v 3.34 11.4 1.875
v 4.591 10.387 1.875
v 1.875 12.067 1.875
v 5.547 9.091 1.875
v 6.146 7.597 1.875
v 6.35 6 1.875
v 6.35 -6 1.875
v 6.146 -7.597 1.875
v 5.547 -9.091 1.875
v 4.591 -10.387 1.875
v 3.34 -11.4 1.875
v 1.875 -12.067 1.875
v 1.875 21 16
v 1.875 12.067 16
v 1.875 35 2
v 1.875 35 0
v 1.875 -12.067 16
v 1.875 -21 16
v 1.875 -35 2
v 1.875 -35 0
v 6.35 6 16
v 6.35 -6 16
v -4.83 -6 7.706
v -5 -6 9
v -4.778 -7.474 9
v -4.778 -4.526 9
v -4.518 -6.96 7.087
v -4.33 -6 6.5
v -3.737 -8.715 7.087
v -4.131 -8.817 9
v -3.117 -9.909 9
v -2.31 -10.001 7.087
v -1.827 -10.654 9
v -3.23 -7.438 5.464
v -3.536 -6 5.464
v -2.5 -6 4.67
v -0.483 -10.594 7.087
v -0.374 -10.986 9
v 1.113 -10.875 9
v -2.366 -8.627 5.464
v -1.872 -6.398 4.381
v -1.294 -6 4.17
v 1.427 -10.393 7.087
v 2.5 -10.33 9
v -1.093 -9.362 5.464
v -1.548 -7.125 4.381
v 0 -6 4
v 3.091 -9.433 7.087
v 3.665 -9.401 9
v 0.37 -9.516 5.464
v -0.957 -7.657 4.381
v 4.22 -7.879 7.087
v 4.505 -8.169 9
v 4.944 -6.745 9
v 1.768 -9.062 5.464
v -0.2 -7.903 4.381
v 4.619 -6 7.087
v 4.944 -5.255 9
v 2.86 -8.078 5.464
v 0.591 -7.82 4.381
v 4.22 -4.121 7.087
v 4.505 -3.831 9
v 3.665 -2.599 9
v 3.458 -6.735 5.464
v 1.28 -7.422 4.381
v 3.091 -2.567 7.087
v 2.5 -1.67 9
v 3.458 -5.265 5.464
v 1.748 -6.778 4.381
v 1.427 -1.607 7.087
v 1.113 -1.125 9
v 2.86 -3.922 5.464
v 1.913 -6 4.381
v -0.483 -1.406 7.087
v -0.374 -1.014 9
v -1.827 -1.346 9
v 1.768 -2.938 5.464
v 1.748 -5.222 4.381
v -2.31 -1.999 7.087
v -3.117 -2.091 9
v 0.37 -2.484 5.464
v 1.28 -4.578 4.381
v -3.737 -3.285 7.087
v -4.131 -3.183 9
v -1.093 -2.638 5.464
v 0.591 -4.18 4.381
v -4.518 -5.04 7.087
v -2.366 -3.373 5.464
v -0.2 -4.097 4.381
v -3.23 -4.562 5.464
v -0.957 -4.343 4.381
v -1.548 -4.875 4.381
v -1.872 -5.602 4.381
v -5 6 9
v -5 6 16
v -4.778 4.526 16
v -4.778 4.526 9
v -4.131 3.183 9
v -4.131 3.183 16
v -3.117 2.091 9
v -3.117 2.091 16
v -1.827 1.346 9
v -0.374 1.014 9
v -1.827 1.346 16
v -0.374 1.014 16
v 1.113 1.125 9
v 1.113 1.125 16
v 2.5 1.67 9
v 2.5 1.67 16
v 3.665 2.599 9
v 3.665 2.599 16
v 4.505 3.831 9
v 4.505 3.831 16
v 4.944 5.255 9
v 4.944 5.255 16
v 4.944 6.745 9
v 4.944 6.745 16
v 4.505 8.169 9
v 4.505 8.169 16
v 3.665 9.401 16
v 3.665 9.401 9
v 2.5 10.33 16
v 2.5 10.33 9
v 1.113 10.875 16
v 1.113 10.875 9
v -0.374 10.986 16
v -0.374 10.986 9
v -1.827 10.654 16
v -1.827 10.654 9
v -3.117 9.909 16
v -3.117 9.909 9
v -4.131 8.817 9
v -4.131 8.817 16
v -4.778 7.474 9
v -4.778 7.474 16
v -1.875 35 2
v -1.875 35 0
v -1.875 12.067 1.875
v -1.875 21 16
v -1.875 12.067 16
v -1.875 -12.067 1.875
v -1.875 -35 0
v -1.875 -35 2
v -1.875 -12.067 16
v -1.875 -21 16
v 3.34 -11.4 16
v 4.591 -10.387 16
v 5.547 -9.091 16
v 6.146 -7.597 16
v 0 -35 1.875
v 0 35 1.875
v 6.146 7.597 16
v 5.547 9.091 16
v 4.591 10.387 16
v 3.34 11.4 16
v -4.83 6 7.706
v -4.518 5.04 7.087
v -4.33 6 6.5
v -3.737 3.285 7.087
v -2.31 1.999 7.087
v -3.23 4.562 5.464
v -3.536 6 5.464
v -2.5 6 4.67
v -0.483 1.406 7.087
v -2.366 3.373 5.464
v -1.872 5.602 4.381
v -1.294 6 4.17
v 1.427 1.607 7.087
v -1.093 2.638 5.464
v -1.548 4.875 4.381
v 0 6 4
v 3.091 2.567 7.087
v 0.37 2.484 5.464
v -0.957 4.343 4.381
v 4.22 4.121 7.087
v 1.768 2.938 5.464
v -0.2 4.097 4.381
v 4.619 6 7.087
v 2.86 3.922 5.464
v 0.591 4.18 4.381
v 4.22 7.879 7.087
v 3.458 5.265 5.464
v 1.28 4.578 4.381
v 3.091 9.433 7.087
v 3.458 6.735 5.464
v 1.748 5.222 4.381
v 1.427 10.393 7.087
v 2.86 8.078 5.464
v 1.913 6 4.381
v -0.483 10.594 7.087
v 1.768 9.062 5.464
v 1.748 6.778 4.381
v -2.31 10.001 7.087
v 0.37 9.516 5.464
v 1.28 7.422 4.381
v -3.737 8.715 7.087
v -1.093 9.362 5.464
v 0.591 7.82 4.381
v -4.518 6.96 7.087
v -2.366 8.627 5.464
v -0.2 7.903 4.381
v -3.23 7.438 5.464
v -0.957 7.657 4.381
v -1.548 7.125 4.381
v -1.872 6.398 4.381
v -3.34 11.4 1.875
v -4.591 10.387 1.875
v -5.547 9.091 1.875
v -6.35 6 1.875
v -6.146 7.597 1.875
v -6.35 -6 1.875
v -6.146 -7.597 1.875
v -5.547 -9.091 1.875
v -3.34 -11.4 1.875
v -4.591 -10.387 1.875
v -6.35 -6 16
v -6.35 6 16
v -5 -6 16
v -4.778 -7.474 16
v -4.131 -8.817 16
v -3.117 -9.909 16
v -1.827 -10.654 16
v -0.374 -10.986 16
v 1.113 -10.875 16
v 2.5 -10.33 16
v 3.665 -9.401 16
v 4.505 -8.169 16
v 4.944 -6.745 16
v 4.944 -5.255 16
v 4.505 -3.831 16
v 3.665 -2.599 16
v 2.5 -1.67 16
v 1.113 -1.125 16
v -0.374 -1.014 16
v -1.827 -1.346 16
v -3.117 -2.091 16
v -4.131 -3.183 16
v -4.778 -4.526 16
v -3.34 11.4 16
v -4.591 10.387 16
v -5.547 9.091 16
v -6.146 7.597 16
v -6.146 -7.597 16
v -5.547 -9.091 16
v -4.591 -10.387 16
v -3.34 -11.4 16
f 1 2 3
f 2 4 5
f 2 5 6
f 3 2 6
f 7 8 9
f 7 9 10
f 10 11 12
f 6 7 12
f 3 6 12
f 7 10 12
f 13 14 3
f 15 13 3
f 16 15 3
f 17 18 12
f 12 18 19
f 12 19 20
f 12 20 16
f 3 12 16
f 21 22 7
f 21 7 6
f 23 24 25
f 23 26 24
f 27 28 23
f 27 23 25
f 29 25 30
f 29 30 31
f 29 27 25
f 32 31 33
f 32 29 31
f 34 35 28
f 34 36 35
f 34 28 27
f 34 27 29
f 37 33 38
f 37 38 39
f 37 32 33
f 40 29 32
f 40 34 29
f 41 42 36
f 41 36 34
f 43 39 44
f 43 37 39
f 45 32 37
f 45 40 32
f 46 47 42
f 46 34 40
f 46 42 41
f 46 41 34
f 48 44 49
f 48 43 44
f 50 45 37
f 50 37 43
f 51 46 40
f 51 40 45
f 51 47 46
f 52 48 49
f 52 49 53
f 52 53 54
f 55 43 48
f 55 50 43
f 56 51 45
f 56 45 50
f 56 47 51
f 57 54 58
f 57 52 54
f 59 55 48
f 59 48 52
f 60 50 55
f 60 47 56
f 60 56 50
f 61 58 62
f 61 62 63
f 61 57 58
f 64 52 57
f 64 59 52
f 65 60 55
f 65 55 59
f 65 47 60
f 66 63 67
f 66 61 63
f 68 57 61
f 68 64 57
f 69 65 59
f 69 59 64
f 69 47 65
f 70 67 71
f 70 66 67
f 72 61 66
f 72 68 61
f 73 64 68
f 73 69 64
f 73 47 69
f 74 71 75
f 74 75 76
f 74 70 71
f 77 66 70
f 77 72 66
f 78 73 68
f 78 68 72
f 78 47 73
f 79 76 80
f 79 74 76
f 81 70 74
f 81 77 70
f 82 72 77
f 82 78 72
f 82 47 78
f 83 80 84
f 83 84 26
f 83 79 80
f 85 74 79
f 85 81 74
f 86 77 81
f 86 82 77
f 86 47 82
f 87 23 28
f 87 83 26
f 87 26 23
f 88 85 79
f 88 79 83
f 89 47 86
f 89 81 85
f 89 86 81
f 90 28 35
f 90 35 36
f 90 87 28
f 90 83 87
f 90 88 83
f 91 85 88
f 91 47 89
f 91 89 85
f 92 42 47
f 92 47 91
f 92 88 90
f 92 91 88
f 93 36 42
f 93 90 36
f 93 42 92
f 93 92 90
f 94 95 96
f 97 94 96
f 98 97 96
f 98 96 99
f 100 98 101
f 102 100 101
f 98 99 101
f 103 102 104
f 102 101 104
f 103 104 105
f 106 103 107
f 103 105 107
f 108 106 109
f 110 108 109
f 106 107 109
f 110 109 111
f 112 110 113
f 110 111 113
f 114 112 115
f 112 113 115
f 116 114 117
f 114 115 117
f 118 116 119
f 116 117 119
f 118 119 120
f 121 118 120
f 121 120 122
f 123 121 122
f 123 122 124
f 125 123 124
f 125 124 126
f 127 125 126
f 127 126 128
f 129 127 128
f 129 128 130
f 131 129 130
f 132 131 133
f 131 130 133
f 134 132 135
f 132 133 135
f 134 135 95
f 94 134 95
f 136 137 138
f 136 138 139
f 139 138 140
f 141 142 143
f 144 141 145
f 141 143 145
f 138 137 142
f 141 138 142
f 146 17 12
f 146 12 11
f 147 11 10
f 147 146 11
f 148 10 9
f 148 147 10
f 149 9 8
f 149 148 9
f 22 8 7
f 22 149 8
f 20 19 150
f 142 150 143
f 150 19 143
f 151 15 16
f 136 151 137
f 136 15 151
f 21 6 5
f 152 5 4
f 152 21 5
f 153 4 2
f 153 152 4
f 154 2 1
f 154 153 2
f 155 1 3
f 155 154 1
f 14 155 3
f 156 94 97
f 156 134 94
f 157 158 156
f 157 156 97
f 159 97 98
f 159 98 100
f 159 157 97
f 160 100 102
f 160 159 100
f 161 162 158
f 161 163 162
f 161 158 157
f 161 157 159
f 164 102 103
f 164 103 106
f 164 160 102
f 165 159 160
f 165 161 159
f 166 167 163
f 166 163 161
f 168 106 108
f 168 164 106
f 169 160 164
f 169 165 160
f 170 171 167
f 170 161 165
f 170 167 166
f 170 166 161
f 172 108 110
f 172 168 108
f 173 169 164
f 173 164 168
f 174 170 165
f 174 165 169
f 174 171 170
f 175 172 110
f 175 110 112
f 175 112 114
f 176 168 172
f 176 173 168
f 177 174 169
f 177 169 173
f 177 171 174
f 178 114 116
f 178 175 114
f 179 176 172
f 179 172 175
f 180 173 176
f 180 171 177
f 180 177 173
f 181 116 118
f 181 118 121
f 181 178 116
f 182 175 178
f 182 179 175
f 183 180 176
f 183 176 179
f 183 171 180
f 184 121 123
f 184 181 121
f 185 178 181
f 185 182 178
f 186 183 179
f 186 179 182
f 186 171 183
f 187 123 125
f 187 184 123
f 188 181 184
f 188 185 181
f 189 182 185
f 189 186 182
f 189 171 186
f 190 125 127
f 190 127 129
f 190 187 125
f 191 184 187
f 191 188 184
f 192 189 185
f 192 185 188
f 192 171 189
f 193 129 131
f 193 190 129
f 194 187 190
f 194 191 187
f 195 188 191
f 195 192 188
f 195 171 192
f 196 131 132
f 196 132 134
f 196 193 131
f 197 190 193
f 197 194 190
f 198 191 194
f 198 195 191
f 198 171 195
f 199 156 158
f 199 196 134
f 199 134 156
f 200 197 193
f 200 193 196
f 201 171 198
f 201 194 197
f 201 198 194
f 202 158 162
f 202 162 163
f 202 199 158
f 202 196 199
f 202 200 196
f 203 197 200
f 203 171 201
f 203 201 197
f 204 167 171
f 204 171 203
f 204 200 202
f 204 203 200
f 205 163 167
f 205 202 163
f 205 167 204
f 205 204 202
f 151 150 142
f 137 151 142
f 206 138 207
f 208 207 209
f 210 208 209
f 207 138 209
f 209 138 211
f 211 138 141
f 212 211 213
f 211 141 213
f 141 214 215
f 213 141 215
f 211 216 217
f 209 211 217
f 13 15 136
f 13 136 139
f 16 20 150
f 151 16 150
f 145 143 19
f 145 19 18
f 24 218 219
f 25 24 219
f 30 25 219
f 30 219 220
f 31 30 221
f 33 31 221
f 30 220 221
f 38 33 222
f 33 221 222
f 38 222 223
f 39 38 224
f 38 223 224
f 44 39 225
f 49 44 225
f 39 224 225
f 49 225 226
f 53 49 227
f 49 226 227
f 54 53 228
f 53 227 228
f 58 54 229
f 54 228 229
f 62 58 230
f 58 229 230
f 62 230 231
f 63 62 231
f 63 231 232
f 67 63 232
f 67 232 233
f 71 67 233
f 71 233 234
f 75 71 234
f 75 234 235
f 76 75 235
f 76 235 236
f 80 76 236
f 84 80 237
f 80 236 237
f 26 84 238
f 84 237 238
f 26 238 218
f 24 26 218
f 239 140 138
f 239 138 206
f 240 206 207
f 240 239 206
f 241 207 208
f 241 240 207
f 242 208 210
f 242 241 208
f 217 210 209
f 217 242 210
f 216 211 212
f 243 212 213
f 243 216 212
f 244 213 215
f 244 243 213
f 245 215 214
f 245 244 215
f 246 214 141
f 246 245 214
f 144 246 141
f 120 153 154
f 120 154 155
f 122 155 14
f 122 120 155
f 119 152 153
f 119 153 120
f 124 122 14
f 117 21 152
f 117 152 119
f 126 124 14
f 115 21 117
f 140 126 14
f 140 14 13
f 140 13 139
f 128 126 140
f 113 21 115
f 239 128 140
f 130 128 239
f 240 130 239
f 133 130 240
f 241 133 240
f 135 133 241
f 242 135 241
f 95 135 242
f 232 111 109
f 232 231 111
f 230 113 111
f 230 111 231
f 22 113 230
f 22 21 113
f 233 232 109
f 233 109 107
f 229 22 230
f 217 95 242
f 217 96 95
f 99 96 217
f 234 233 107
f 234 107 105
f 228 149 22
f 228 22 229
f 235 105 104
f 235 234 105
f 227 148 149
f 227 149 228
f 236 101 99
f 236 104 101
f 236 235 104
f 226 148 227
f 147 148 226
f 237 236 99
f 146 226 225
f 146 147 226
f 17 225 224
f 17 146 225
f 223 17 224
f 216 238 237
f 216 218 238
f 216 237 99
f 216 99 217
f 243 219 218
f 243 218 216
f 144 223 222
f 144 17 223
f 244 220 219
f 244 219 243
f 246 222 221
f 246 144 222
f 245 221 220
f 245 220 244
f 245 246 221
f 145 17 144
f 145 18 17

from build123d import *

# Parameters (mm, degrees)
PAD_DEPTH       = 35
PAD001_DEPTH    = 14.125
SKETCH006_R     = 5
POCKET_DEPTH    = 12
POCKET001_DEPTH = 2.5
FILLET_R        = 5


with BuildPart() as part:
    # Sketch → Pad (new body, symmetric)
    with BuildSketch(Plane.XZ):
        Polygon((0, 1.875), (-1.875, 0), (-1.875, 16), (1.875, 16), (1.875, 0), align=None)
    extrude(amount=PAD_DEPTH, both=True)

    # Sketch001 (on Face3 of Pad) → Pad001 (join)
    with BuildSketch(Plane(origin=(0, 0, 16), x_dir=(-1, 0, 0), z_dir=(0, 0, 1))):
        with BuildLine():
            ThreePointArc((6.35, 6), (0, 12.35), (-6.35, 6))
            Line((-6.35, 6), (-6.35, -6))
            ThreePointArc((-6.35, -6), (0, -12.35), (6.35, -6))
            Line((6.35, 6), (6.35, -6))
        make_face()
    extrude(amount=-PAD001_DEPTH)

    # Sketch006 (on Face15 of Pad001) → Pocket (cut)
    with BuildSketch(Plane(origin=(0, 0, 16), x_dir=(-1, 0, 0), z_dir=(0, 0, 1))):
        with Locations((0, 6)):
            Circle(SKETCH006_R)
        with Locations((0, -6)):
            Circle(SKETCH006_R)
    extrude(amount=-POCKET_DEPTH, mode=Mode.SUBTRACT)

    # Sketch005 → Pocket001 (cut, symmetric)
    with BuildSketch(Plane.YZ):
        Polygon((-36, 25), (-36, 1), (-12, 25), align=None)
        Polygon((12, 25), (36, 25), (36, 1), align=None)
    extrude(amount=POCKET001_DEPTH, both=True, mode=Mode.SUBTRACT)

    # Fillet
    fillet_edges = [part.edges().sort_by_distance(p)[0] for p in [
        (5, -6, 4),
        (5, 6, 4),
    ]]
    fillet(fillet_edges, radius=FILLET_R)


solid = part.part
